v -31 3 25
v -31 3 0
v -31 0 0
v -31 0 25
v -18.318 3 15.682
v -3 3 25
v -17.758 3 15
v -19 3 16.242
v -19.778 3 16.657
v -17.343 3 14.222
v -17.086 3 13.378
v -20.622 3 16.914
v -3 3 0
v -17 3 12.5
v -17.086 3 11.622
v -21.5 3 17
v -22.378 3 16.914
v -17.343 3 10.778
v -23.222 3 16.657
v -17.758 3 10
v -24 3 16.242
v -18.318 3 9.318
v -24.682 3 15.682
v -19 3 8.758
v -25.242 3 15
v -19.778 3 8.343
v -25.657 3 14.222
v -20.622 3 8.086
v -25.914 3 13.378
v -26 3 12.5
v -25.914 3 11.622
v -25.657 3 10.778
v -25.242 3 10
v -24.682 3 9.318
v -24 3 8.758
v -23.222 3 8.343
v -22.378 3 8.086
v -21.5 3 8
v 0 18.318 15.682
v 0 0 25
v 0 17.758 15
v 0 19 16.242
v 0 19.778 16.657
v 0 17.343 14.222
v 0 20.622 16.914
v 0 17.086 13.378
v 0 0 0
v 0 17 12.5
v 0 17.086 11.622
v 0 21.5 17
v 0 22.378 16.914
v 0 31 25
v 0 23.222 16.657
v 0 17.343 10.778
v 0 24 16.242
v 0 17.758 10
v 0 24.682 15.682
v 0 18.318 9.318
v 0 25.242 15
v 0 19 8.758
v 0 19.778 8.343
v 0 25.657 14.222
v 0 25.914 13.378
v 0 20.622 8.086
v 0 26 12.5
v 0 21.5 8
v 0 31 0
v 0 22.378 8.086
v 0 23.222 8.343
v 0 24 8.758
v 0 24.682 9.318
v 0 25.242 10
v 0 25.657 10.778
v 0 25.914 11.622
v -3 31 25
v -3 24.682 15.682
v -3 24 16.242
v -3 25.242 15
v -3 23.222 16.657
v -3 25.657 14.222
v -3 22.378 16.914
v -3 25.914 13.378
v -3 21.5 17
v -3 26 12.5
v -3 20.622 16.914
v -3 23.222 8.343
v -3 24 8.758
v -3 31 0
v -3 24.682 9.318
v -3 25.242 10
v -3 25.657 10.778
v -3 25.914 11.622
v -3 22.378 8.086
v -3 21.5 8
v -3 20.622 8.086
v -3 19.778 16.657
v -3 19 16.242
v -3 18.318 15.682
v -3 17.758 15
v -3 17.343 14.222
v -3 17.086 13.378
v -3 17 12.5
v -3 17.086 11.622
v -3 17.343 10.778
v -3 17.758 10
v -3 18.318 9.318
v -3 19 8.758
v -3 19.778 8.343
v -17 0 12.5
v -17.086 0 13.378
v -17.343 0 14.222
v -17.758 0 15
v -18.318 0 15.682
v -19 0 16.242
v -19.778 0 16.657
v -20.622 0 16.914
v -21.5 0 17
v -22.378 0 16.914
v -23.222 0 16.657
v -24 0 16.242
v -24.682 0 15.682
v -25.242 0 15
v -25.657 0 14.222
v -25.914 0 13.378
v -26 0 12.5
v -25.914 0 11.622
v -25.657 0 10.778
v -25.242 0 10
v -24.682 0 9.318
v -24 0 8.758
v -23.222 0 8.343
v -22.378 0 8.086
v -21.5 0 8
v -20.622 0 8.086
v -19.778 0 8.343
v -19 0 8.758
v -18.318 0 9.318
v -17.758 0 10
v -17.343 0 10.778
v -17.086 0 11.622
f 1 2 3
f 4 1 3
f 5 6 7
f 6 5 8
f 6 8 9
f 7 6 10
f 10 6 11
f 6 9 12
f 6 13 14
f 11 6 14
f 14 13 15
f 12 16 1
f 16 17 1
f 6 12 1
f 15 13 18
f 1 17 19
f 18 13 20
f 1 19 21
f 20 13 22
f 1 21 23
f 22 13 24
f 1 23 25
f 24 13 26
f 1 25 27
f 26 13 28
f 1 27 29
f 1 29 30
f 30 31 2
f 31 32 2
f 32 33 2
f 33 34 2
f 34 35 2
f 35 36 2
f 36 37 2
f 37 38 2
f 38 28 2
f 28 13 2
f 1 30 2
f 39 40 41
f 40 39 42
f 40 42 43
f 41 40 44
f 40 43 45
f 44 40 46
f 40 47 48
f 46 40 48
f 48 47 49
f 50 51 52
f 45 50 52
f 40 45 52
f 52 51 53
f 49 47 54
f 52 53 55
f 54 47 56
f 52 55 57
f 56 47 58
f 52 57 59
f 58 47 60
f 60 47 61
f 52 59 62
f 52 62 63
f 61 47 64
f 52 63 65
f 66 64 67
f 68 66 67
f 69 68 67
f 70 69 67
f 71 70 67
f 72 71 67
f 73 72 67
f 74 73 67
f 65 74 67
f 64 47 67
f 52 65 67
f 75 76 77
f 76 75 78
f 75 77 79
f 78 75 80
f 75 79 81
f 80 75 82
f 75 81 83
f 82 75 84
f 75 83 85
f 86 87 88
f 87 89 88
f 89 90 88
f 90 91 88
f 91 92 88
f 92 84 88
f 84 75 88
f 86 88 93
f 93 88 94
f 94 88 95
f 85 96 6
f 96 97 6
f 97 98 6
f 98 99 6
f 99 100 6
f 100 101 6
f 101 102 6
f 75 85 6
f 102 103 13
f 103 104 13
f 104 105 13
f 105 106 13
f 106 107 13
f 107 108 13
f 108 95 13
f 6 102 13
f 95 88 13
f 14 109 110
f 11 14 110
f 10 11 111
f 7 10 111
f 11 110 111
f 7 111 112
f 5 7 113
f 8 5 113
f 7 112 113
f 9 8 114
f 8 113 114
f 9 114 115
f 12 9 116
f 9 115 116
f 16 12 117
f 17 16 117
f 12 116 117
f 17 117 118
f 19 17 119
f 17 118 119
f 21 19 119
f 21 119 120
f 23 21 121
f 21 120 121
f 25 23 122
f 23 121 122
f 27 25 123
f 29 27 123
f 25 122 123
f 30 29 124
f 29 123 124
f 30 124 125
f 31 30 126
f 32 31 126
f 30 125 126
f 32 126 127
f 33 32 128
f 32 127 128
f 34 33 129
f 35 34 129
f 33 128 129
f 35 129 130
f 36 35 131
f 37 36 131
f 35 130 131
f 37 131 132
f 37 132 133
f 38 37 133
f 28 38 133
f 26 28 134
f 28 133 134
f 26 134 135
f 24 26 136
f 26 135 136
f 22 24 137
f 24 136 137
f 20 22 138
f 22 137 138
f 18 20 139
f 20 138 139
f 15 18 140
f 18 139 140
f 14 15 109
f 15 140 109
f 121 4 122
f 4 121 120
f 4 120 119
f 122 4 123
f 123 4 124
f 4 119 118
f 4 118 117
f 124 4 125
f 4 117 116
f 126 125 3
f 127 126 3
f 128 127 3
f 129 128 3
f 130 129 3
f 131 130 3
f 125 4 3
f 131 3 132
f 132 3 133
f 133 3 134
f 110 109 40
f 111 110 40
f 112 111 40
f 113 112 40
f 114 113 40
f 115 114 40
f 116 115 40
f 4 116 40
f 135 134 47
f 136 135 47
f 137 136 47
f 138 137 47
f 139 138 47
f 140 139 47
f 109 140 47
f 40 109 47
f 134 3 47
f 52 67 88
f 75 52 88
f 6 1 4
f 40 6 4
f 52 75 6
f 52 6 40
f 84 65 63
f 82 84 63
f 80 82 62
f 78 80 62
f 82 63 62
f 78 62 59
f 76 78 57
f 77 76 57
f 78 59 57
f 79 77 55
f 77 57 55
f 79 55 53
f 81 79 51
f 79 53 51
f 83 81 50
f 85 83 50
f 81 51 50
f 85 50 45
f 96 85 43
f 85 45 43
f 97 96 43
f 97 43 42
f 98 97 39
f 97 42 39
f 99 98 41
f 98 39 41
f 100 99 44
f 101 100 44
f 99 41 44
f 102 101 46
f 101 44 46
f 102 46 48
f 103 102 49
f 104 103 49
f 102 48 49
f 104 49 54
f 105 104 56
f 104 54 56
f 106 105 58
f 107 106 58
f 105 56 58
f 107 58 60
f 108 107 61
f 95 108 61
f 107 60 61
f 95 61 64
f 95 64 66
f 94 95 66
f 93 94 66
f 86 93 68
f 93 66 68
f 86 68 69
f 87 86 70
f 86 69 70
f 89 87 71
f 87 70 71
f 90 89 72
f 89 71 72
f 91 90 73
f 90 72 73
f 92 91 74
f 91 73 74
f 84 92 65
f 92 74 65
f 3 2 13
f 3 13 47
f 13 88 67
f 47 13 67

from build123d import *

# Parameters (mm, degrees)
F2_DEPTH = 25
F3_R     = 4.5
F4_DEPTH = 3
F5_R     = 4.5
F6_DEPTH = 3


with BuildPart() as f2:
    # F1 (on Top) → F2 (new body)
    with BuildSketch(Plane.XY):
        Polygon((-31, 0), (0, 0), (0, 31), (-3, 31), (-3, 3), (-31, 3), align=None)
    extrude(amount=F2_DEPTH)

    # F3 (on face) → F4 (cut, through all)
    with BuildSketch(Plane.XZ):
        with Locations((-21.5, 12.5)):
            Circle(F3_R)
    extrude(amount=-F4_DEPTH, mode=Mode.SUBTRACT)

    # F5 (on face) → F6 (cut, through all)
    with BuildSketch(Plane.YZ):
        with Locations((21.5, 12.5)):
            Circle(F5_R)
    extrude(amount=-F6_DEPTH, mode=Mode.SUBTRACT)


solid = f2.part
